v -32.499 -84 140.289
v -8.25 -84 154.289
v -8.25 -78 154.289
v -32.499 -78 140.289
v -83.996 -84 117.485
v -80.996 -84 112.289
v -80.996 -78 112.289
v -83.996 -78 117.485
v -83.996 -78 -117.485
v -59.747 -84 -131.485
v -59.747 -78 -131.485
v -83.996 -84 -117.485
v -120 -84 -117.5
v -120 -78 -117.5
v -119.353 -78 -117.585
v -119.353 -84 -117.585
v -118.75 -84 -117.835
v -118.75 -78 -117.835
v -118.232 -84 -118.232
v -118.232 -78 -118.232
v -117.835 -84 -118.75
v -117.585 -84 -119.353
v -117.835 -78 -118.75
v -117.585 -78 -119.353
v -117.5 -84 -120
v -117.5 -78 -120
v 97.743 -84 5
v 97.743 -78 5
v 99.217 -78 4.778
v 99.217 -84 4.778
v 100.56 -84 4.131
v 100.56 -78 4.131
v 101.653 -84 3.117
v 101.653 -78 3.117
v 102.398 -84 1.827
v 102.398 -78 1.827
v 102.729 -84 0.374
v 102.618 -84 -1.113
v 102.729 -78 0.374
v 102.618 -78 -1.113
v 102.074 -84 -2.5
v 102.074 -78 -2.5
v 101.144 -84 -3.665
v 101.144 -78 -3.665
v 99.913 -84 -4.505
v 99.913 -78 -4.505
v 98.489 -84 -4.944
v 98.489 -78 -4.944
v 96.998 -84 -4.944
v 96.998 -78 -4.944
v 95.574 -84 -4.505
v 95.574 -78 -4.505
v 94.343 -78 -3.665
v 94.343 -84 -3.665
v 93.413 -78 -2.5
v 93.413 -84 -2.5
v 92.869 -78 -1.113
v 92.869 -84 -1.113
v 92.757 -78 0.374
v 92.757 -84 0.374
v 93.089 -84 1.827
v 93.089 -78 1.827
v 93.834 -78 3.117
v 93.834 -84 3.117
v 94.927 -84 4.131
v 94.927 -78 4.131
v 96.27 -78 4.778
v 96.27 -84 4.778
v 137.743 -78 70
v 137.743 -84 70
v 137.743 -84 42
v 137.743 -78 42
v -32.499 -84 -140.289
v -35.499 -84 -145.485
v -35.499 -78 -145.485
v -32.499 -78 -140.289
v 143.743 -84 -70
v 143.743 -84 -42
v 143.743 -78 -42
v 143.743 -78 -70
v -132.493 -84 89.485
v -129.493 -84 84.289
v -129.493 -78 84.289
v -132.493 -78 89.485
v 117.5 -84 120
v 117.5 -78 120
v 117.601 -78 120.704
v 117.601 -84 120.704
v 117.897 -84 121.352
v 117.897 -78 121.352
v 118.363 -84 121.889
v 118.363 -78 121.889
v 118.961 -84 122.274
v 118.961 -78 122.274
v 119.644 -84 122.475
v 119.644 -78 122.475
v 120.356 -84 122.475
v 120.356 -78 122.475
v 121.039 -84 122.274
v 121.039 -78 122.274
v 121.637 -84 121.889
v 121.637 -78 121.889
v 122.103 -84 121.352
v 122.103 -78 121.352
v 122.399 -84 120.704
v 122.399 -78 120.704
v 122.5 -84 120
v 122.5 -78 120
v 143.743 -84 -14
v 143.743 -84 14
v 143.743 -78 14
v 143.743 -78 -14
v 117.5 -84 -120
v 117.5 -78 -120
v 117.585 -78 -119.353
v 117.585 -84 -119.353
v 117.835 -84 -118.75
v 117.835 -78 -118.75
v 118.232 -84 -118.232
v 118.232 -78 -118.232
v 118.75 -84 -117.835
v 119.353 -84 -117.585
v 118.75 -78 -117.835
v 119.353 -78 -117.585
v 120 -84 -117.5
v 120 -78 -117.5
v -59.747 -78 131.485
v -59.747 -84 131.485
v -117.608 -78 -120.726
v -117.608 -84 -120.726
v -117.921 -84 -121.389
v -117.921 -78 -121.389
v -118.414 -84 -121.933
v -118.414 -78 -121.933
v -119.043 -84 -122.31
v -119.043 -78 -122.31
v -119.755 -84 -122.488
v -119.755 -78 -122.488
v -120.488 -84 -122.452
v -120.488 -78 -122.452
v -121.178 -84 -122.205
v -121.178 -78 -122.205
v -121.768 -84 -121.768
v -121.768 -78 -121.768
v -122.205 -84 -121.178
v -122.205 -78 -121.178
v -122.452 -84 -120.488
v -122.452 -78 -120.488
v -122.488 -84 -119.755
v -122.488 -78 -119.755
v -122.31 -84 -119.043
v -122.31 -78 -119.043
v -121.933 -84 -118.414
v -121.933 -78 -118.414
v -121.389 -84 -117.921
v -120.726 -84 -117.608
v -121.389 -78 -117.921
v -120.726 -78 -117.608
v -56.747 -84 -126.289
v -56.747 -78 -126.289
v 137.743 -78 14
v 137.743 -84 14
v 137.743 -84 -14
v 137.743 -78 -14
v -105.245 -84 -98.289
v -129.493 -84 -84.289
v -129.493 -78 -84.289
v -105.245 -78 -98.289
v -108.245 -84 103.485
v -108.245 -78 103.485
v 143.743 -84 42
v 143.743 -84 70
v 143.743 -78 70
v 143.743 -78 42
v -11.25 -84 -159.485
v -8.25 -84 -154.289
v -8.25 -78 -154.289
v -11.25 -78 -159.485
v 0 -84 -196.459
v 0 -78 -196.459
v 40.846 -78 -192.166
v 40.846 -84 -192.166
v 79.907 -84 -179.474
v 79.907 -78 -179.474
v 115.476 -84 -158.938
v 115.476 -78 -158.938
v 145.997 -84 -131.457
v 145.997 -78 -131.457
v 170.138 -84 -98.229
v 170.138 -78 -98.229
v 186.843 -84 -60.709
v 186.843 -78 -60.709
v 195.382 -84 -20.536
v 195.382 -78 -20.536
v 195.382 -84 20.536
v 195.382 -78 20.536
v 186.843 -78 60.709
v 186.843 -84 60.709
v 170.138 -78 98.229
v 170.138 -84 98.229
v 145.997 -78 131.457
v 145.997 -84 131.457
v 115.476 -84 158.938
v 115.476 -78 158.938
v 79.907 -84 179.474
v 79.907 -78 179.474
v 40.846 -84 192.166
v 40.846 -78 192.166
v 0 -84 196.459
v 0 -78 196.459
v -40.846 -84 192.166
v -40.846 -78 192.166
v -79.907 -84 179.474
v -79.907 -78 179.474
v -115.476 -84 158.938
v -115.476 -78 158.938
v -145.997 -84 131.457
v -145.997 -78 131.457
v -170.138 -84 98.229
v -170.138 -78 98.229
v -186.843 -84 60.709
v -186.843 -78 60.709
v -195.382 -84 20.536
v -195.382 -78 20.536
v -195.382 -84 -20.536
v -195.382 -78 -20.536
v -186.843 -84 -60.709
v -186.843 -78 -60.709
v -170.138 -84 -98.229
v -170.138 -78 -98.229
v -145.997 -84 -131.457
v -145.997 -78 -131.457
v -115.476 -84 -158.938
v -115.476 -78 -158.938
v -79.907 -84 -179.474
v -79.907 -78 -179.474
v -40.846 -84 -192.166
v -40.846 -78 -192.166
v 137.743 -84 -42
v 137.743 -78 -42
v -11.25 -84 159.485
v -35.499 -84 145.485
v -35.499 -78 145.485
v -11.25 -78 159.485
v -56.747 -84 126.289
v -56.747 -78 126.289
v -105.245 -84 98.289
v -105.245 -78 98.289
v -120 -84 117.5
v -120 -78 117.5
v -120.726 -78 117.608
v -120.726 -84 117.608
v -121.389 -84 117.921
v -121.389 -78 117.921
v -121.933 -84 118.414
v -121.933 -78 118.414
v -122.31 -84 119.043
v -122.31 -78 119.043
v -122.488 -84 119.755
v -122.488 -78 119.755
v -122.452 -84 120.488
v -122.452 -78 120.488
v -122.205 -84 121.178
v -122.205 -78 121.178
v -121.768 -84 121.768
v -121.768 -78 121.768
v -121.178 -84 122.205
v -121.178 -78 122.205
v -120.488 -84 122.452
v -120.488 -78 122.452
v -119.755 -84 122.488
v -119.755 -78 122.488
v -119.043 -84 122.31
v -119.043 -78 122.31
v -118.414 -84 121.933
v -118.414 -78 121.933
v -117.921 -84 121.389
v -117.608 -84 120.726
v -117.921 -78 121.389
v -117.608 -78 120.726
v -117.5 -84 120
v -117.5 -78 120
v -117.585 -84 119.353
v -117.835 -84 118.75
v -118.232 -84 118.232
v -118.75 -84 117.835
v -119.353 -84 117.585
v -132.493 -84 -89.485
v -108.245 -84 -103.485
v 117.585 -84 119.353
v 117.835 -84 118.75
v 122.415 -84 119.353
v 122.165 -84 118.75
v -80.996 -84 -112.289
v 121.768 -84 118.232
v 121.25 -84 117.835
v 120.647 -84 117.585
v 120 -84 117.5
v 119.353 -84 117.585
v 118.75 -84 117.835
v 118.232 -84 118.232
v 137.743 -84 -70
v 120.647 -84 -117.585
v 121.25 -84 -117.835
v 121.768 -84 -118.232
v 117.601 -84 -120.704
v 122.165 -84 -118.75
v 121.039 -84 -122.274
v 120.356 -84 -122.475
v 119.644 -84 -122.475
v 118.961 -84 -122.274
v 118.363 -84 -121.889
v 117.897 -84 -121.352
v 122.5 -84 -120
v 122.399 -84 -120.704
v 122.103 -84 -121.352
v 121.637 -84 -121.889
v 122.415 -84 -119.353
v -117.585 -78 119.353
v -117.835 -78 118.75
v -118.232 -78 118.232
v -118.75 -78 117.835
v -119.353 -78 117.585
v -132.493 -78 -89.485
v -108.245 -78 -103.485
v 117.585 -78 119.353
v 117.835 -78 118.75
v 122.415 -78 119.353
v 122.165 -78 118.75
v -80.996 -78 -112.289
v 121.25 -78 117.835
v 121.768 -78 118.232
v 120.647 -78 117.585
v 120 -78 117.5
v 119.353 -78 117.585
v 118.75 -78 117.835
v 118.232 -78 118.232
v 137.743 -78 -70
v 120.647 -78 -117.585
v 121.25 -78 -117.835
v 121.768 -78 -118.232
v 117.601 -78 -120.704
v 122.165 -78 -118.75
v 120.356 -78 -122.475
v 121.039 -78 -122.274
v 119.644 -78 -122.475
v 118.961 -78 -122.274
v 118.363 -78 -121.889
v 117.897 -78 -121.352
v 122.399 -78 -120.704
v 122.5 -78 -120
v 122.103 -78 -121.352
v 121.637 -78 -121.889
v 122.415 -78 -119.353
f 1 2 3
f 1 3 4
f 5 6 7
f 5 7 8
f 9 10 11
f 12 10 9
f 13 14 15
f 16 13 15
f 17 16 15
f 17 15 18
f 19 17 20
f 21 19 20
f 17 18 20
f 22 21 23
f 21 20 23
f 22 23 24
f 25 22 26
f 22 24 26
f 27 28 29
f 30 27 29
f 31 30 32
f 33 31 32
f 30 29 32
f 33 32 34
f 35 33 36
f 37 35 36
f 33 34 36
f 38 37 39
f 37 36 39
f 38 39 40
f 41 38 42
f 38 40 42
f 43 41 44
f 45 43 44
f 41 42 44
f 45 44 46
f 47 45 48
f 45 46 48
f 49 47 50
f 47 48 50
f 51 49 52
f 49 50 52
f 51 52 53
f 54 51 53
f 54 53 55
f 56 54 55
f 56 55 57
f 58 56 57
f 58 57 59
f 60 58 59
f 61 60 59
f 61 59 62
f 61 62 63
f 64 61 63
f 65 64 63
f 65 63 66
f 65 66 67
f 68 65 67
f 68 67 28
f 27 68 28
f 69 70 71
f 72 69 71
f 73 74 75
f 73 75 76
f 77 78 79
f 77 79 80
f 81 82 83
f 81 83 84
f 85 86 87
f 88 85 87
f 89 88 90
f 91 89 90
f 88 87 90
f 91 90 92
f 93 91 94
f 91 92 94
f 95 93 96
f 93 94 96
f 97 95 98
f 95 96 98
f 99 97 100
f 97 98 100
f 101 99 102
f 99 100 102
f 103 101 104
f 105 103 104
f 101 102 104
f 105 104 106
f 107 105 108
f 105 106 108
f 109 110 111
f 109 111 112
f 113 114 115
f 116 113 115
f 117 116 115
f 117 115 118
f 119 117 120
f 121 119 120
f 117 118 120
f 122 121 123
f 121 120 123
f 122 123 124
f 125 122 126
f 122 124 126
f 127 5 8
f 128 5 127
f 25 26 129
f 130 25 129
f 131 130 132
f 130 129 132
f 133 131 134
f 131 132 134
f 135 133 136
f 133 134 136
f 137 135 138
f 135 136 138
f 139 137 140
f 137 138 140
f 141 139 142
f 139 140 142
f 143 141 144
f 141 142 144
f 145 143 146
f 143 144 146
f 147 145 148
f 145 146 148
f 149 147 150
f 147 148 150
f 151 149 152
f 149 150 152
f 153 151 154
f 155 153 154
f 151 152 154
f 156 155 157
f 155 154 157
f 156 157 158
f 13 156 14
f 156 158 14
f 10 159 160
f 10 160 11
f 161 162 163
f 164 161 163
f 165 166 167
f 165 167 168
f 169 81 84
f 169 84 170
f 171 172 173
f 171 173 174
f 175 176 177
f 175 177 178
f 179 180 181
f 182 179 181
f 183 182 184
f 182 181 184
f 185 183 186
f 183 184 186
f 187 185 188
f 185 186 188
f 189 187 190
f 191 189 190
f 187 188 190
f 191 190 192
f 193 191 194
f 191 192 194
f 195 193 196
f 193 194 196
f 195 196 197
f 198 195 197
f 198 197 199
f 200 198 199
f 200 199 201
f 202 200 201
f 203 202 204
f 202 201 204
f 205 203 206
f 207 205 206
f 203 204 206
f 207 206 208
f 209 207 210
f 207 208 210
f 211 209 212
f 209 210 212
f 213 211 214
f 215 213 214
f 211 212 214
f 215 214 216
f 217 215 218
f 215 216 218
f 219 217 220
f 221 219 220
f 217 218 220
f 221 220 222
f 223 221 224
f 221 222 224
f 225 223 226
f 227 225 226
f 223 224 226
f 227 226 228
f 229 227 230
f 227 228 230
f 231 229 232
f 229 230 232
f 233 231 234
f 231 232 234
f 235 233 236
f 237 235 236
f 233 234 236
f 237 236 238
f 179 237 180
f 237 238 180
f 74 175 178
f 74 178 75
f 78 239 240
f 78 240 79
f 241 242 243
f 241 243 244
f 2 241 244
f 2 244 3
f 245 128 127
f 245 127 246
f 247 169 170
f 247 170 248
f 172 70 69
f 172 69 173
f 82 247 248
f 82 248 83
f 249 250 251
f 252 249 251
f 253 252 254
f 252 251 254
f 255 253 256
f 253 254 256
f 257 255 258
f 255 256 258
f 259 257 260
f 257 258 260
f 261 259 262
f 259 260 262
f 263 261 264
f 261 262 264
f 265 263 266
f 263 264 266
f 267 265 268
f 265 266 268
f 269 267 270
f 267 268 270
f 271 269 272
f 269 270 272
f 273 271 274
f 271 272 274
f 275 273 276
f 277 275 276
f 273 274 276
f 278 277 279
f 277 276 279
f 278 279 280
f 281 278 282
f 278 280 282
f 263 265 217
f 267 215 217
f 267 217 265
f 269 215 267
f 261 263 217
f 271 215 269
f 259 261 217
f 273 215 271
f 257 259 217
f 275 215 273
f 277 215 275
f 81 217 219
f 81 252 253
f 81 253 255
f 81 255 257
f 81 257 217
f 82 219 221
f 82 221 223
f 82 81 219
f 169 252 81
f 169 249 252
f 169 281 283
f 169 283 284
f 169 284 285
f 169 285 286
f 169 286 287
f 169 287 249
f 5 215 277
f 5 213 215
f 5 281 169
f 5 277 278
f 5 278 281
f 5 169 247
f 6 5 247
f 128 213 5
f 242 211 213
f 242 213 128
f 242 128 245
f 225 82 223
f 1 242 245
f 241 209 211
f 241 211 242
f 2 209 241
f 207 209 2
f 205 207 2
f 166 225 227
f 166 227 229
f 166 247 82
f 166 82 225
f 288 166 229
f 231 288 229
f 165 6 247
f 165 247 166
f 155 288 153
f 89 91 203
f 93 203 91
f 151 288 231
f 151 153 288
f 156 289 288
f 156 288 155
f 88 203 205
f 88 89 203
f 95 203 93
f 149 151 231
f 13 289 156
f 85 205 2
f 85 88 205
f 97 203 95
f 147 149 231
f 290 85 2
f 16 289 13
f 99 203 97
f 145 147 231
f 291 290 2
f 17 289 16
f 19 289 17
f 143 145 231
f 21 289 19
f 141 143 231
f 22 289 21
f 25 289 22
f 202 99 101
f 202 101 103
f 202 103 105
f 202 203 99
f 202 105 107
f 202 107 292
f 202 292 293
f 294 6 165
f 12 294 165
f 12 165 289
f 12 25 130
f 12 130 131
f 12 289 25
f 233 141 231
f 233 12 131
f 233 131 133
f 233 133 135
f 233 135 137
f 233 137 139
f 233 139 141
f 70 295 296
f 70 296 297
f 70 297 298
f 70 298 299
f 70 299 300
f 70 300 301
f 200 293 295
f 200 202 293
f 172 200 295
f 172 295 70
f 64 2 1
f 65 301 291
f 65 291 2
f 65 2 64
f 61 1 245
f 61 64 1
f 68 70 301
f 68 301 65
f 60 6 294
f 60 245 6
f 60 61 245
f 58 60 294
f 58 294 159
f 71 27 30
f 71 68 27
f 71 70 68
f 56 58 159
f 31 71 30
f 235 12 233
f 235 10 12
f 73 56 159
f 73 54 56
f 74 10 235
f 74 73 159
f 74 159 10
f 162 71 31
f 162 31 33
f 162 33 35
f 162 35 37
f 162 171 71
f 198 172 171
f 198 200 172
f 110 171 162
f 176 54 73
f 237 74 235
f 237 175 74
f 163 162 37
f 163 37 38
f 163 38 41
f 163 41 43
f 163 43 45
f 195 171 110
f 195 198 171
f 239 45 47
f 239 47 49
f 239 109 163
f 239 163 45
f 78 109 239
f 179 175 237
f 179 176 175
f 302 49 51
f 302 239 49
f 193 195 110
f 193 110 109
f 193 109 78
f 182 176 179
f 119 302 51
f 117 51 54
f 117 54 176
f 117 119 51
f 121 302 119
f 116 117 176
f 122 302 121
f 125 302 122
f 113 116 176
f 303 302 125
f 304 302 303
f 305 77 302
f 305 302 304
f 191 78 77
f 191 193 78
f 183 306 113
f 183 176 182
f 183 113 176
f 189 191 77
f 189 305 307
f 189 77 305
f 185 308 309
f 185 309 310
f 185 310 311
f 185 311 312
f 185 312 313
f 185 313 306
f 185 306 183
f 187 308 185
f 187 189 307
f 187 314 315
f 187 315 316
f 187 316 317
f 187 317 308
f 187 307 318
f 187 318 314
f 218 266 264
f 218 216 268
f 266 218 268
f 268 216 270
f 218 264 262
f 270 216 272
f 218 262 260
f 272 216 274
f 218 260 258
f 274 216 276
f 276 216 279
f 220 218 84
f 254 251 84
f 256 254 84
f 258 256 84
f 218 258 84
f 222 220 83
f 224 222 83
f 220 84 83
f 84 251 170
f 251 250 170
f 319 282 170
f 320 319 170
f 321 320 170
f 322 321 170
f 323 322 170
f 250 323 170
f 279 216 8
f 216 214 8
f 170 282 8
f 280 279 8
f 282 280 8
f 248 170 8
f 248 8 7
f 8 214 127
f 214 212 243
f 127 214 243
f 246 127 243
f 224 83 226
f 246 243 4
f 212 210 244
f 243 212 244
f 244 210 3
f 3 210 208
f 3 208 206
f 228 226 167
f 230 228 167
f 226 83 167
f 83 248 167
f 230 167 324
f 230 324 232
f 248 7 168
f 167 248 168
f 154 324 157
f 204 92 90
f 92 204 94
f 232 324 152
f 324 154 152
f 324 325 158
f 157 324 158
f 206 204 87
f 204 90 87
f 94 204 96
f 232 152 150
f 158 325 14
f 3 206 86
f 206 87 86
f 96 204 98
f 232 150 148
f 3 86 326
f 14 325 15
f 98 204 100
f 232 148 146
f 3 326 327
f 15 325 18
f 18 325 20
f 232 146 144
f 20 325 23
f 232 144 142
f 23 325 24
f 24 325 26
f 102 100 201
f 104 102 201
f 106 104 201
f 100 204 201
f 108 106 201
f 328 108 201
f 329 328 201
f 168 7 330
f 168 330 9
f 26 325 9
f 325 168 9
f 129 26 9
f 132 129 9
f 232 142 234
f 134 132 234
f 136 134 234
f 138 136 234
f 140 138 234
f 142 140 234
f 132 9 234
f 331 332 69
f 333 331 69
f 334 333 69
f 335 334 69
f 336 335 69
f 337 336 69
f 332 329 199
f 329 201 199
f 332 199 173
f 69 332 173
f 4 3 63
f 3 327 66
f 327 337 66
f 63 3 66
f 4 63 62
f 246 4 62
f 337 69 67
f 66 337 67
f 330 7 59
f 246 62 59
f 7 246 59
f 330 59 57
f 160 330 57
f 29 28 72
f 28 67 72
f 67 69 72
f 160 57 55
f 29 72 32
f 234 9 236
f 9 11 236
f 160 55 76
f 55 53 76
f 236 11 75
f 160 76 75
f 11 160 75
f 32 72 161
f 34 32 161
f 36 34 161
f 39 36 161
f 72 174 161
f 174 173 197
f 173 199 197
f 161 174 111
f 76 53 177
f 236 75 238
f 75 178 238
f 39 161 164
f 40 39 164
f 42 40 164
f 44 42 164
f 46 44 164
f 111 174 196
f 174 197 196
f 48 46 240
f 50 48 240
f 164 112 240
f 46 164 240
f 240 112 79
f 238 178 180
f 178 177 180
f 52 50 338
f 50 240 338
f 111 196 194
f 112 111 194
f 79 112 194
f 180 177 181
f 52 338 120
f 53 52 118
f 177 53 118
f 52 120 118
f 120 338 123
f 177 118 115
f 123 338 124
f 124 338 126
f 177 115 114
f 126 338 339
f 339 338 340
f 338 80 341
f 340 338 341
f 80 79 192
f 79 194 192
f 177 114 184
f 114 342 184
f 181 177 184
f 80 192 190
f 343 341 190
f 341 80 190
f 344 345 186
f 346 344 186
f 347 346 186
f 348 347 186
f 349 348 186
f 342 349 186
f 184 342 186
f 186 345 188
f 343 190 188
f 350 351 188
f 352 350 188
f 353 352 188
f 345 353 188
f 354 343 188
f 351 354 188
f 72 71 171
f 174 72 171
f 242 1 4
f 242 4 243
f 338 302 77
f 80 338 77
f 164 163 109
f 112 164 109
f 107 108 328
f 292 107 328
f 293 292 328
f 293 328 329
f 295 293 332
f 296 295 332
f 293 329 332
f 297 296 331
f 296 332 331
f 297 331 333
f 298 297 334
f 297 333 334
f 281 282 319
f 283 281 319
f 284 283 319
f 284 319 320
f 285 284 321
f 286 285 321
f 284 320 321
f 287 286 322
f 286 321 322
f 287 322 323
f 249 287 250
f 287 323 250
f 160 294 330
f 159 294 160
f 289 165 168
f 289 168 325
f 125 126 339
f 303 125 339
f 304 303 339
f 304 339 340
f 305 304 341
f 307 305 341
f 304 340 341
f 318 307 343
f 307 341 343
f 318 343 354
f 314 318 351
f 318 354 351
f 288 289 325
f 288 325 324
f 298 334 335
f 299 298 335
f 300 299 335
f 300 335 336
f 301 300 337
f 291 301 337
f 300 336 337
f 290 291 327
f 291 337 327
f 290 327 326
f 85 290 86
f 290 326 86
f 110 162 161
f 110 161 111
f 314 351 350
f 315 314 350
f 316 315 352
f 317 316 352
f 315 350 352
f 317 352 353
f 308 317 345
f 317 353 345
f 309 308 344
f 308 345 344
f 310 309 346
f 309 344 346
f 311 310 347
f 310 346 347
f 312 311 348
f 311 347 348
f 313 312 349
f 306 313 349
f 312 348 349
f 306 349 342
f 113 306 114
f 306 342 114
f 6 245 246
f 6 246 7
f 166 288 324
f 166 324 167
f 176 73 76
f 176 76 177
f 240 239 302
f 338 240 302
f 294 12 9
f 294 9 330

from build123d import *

# Parameters (mm, degrees)
ESQUISSE1_R             = 196.45866198
BOSS_EXTRU_1_DEPTH      = 6
EMPREINTE1_START        = -84
EMPREINTE1_OUTLINE_W    = 6
EMPREINTE1_OUTLINE_H    = 28
EMPREINTE1_DEPTH        = 6
ESQUISSE2_R             = 5
ENL_V_MAT_EXTRU_1_DEPTH = 10


# Read off the part's stored shape, not the designer's step: Empreinte1
with BuildPart() as part:
    # Esquisse1 → Boss.-Extru.1 (new body)
    with BuildSketch(Plane(origin=(0, -78, 0), x_dir=(-1, 0, 0), z_dir=(0, -1, 0))):
        with Locations(Location((0, 0, 0), (0, 0, 90))):
            Circle(ESQUISSE1_R)
    extrude(amount=BOSS_EXTRU_1_DEPTH)

    # Empreinte1 outline → Empreinte1 (cut)
    with BuildSketch(Plane(origin=(0, 0, 0), x_dir=(1, 0, 0), z_dir=(0, 1, 0)).offset(EMPREINTE1_START)):
        Polygon((-11.249911594, 159.485418462), (-35.4986229, 145.485418462), (-32.4986229, 140.28926604), (-8.249911594, 154.28926604), align=None)
        Polygon((-59.747334206, 131.485418462), (-83.996045512, 117.485418462), (-80.996045512, 112.28926604), (-56.747334206, 126.28926604), align=None)
        Polygon((-108.244756818, 103.485418462), (-132.493468124, 89.485418462), (-129.493468124, 84.28926604), (-105.244756818, 98.28926604), align=None)
        with Locations((140.743379719, -56)):
            Rectangle(EMPREINTE1_OUTLINE_W, EMPREINTE1_OUTLINE_H)
        with Locations((140.743379719, 0)):
            Rectangle(EMPREINTE1_OUTLINE_W, EMPREINTE1_OUTLINE_H)
        with Locations((140.743379719, 56)):
            Rectangle(EMPREINTE1_OUTLINE_W, EMPREINTE1_OUTLINE_H)
        Polygon((-132.493468124, -89.485418462), (-108.244756818, -103.485418462), (-105.244756818, -98.28926604), (-129.493468124, -84.28926604), align=None)
        Polygon((-83.996045512, -117.485418462), (-59.747334206, -131.485418462), (-56.747334206, -126.28926604), (-80.996045512, -112.28926604), align=None)
        Polygon((-35.4986229, -145.485418462), (-11.249911594, -159.485418462), (-8.249911594, -154.28926604), (-32.4986229, -140.28926604), align=None)
    extrude(amount=EMPREINTE1_DEPTH, mode=Mode.SUBTRACT)

    # Esquisse2 → Enlèv. mat.-Extru.1 (cut)
    with BuildSketch(Plane(origin=(0, -78, 0), x_dir=(1, 0, 0), z_dir=(0, 1, 0))):
        with BuildLine():
            ThreePointArc((-117.5, 120), (-121.767766953, 121.767766953), (-120, 117.5))
            Line((-120, 117.5), (-120, 120))
            Line((-120, 120), (-117.5, 120))
        make_face()
        with BuildLine():
            Line((-120, 120), (-120, 117.5))
            ThreePointArc((-120, 117.5), (-118.232233047, 118.232233047), (-117.5, 120))
            Line((-117.5, 120), (-120, 120))
        make_face()
        with BuildLine():
            ThreePointArc((117.5, 120), (118.232233047, 118.232233047), (120, 117.5))
            Line((120, 117.5), (120, 120))
            Line((120, 120), (117.5, 120))
        make_face()
        with BuildLine():
            Line((120, 120), (120, 117.5))
            ThreePointArc((120, 117.5), (121.767766953, 118.232233047), (122.5, 120))
            ThreePointArc((122.5, 120), (120, 122.5), (117.5, 120))
            Line((117.5, 120), (120, 120))
        make_face()
        with BuildLine():
            ThreePointArc((120, -117.5), (118.232233047, -118.232233047), (117.5, -120))
            Line((117.5, -120), (120, -120))
            Line((120, -120), (120, -117.5))
        make_face()
        with BuildLine():
            Line((120, -120), (117.5, -120))
            ThreePointArc((117.5, -120), (120, -122.5), (122.5, -120))
            ThreePointArc((122.5, -120), (121.767766953, -118.232233047), (120, -117.5))
            Line((120, -117.5), (120, -120))
        make_face()
        with BuildLine():
            Line((-120, -117.5), (-120, -120))
            Line((-120, -120), (-117.5, -120))
            ThreePointArc((-117.5, -120), (-118.232233047, -118.232233047), (-120, -117.5))
        make_face()
        with BuildLine():
            Line((-117.5, -120), (-120, -120))
            Line((-120, -120), (-120, -117.5))
            ThreePointArc((-120, -117.5), (-121.767766953, -121.767766953), (-117.5, -120))
        make_face()
        with Locations(Location((97.743379719, 0, 0), (0, 0, 270))):
            Circle(ESQUISSE2_R)
    extrude(amount=-ENL_V_MAT_EXTRU_1_DEPTH, mode=Mode.SUBTRACT)


solid = part.part
